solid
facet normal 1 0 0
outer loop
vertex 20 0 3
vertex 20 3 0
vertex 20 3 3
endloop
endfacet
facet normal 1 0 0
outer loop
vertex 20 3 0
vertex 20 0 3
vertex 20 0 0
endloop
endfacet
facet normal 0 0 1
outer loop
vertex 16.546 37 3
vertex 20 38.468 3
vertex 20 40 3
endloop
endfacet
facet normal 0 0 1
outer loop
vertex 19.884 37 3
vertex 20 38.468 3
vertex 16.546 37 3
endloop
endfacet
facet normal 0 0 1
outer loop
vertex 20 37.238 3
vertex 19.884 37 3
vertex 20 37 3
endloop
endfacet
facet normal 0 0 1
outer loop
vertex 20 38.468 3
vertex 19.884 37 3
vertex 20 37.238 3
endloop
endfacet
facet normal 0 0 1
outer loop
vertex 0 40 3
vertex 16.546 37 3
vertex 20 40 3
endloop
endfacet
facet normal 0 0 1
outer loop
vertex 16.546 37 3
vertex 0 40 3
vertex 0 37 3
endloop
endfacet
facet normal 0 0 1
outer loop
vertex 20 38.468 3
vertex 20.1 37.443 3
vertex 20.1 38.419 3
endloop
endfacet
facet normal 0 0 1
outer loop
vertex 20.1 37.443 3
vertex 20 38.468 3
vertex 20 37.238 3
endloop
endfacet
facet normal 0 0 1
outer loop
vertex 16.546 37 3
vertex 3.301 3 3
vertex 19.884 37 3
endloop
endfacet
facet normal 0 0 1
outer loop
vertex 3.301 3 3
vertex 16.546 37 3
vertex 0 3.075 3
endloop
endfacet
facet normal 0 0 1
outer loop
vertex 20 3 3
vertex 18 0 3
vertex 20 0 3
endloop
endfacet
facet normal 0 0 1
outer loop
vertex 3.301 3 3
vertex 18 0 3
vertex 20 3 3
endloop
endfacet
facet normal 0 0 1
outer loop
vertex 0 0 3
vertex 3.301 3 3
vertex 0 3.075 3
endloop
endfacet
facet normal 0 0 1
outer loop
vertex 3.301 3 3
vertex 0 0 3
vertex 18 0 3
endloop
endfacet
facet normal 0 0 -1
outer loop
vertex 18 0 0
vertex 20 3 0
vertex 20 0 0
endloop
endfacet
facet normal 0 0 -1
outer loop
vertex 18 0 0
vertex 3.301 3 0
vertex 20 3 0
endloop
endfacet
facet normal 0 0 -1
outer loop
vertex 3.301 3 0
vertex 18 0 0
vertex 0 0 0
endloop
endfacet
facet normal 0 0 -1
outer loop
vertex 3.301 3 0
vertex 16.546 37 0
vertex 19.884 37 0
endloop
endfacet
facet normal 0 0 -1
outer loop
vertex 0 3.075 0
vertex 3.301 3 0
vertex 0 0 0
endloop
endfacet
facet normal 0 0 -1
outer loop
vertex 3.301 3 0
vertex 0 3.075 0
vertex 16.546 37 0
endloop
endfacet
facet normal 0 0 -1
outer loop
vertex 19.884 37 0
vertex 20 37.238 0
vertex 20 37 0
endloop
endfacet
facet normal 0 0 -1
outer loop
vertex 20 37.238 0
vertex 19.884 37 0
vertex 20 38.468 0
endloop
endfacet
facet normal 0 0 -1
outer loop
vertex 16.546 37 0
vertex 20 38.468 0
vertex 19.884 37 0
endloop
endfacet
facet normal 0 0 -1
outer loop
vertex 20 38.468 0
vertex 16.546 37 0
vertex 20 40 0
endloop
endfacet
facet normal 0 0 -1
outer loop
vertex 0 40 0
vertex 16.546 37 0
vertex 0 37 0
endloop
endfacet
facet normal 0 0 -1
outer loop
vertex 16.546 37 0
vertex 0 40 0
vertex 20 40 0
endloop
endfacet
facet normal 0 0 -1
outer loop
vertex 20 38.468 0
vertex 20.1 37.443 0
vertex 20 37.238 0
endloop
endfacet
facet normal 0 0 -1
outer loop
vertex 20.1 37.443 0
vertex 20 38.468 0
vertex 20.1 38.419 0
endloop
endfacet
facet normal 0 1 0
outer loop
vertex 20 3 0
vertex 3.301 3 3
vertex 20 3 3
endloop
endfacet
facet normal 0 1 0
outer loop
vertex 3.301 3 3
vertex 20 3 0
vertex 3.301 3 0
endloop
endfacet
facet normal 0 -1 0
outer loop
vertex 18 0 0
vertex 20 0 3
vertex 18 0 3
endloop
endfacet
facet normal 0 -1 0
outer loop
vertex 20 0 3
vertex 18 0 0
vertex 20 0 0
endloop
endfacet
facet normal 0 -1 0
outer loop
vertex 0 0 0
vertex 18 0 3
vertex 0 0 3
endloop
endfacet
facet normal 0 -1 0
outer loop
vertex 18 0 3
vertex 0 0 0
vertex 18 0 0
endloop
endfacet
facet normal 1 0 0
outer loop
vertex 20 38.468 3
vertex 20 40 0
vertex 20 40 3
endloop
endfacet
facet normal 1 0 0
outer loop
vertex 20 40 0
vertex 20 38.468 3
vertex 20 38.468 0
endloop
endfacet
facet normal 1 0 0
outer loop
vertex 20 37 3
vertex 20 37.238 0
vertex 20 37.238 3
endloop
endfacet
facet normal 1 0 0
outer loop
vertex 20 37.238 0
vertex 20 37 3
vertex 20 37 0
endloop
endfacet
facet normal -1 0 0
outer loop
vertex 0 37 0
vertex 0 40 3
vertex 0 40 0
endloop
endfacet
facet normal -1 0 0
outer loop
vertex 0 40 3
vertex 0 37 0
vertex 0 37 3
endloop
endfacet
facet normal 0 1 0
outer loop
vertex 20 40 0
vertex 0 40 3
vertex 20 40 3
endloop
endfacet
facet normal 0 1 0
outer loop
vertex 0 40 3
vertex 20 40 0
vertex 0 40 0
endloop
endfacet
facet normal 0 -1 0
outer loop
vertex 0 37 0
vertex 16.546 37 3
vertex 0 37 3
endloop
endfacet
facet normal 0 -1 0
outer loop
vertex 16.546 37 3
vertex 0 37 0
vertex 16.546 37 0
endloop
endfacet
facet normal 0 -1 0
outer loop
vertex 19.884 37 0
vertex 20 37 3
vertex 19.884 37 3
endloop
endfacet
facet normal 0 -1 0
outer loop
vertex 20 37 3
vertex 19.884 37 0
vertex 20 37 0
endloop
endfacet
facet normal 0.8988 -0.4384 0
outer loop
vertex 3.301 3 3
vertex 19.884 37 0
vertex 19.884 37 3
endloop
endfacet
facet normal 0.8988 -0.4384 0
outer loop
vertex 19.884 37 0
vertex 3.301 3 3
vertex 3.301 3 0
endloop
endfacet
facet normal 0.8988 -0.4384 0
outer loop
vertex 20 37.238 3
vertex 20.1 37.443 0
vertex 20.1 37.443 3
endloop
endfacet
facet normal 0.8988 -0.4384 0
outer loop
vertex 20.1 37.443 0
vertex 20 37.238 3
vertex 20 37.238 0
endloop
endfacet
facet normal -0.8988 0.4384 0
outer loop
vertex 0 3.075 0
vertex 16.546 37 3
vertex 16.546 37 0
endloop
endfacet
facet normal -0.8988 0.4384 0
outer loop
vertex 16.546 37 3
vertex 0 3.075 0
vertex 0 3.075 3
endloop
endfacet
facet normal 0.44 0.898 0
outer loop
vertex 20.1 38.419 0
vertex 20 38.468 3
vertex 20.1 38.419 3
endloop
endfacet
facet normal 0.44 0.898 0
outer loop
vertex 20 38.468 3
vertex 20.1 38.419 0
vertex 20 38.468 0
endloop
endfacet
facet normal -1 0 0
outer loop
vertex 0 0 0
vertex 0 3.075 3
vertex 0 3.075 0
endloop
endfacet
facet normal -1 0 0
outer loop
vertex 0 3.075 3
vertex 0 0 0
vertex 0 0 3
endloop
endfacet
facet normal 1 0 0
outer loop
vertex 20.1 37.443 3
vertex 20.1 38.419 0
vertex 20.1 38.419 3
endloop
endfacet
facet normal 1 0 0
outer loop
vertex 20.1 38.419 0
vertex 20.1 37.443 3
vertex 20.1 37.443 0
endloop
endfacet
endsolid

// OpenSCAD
difference(){
union(){
	translate([]) cube([20,3,3]);
	translate([0,37,0]) cube([20,3,3]);
	translate([-1.5,0,0]) rotate([0,0,334]) cube([3,44,3]);
}
	translate([-5,-10,-1]) cube([5,20,5]);
	translate([-2,-5,-1]) cube([20,5,5]);
	translate([20.1,30,-1]) cube([5,20,5]);
}
